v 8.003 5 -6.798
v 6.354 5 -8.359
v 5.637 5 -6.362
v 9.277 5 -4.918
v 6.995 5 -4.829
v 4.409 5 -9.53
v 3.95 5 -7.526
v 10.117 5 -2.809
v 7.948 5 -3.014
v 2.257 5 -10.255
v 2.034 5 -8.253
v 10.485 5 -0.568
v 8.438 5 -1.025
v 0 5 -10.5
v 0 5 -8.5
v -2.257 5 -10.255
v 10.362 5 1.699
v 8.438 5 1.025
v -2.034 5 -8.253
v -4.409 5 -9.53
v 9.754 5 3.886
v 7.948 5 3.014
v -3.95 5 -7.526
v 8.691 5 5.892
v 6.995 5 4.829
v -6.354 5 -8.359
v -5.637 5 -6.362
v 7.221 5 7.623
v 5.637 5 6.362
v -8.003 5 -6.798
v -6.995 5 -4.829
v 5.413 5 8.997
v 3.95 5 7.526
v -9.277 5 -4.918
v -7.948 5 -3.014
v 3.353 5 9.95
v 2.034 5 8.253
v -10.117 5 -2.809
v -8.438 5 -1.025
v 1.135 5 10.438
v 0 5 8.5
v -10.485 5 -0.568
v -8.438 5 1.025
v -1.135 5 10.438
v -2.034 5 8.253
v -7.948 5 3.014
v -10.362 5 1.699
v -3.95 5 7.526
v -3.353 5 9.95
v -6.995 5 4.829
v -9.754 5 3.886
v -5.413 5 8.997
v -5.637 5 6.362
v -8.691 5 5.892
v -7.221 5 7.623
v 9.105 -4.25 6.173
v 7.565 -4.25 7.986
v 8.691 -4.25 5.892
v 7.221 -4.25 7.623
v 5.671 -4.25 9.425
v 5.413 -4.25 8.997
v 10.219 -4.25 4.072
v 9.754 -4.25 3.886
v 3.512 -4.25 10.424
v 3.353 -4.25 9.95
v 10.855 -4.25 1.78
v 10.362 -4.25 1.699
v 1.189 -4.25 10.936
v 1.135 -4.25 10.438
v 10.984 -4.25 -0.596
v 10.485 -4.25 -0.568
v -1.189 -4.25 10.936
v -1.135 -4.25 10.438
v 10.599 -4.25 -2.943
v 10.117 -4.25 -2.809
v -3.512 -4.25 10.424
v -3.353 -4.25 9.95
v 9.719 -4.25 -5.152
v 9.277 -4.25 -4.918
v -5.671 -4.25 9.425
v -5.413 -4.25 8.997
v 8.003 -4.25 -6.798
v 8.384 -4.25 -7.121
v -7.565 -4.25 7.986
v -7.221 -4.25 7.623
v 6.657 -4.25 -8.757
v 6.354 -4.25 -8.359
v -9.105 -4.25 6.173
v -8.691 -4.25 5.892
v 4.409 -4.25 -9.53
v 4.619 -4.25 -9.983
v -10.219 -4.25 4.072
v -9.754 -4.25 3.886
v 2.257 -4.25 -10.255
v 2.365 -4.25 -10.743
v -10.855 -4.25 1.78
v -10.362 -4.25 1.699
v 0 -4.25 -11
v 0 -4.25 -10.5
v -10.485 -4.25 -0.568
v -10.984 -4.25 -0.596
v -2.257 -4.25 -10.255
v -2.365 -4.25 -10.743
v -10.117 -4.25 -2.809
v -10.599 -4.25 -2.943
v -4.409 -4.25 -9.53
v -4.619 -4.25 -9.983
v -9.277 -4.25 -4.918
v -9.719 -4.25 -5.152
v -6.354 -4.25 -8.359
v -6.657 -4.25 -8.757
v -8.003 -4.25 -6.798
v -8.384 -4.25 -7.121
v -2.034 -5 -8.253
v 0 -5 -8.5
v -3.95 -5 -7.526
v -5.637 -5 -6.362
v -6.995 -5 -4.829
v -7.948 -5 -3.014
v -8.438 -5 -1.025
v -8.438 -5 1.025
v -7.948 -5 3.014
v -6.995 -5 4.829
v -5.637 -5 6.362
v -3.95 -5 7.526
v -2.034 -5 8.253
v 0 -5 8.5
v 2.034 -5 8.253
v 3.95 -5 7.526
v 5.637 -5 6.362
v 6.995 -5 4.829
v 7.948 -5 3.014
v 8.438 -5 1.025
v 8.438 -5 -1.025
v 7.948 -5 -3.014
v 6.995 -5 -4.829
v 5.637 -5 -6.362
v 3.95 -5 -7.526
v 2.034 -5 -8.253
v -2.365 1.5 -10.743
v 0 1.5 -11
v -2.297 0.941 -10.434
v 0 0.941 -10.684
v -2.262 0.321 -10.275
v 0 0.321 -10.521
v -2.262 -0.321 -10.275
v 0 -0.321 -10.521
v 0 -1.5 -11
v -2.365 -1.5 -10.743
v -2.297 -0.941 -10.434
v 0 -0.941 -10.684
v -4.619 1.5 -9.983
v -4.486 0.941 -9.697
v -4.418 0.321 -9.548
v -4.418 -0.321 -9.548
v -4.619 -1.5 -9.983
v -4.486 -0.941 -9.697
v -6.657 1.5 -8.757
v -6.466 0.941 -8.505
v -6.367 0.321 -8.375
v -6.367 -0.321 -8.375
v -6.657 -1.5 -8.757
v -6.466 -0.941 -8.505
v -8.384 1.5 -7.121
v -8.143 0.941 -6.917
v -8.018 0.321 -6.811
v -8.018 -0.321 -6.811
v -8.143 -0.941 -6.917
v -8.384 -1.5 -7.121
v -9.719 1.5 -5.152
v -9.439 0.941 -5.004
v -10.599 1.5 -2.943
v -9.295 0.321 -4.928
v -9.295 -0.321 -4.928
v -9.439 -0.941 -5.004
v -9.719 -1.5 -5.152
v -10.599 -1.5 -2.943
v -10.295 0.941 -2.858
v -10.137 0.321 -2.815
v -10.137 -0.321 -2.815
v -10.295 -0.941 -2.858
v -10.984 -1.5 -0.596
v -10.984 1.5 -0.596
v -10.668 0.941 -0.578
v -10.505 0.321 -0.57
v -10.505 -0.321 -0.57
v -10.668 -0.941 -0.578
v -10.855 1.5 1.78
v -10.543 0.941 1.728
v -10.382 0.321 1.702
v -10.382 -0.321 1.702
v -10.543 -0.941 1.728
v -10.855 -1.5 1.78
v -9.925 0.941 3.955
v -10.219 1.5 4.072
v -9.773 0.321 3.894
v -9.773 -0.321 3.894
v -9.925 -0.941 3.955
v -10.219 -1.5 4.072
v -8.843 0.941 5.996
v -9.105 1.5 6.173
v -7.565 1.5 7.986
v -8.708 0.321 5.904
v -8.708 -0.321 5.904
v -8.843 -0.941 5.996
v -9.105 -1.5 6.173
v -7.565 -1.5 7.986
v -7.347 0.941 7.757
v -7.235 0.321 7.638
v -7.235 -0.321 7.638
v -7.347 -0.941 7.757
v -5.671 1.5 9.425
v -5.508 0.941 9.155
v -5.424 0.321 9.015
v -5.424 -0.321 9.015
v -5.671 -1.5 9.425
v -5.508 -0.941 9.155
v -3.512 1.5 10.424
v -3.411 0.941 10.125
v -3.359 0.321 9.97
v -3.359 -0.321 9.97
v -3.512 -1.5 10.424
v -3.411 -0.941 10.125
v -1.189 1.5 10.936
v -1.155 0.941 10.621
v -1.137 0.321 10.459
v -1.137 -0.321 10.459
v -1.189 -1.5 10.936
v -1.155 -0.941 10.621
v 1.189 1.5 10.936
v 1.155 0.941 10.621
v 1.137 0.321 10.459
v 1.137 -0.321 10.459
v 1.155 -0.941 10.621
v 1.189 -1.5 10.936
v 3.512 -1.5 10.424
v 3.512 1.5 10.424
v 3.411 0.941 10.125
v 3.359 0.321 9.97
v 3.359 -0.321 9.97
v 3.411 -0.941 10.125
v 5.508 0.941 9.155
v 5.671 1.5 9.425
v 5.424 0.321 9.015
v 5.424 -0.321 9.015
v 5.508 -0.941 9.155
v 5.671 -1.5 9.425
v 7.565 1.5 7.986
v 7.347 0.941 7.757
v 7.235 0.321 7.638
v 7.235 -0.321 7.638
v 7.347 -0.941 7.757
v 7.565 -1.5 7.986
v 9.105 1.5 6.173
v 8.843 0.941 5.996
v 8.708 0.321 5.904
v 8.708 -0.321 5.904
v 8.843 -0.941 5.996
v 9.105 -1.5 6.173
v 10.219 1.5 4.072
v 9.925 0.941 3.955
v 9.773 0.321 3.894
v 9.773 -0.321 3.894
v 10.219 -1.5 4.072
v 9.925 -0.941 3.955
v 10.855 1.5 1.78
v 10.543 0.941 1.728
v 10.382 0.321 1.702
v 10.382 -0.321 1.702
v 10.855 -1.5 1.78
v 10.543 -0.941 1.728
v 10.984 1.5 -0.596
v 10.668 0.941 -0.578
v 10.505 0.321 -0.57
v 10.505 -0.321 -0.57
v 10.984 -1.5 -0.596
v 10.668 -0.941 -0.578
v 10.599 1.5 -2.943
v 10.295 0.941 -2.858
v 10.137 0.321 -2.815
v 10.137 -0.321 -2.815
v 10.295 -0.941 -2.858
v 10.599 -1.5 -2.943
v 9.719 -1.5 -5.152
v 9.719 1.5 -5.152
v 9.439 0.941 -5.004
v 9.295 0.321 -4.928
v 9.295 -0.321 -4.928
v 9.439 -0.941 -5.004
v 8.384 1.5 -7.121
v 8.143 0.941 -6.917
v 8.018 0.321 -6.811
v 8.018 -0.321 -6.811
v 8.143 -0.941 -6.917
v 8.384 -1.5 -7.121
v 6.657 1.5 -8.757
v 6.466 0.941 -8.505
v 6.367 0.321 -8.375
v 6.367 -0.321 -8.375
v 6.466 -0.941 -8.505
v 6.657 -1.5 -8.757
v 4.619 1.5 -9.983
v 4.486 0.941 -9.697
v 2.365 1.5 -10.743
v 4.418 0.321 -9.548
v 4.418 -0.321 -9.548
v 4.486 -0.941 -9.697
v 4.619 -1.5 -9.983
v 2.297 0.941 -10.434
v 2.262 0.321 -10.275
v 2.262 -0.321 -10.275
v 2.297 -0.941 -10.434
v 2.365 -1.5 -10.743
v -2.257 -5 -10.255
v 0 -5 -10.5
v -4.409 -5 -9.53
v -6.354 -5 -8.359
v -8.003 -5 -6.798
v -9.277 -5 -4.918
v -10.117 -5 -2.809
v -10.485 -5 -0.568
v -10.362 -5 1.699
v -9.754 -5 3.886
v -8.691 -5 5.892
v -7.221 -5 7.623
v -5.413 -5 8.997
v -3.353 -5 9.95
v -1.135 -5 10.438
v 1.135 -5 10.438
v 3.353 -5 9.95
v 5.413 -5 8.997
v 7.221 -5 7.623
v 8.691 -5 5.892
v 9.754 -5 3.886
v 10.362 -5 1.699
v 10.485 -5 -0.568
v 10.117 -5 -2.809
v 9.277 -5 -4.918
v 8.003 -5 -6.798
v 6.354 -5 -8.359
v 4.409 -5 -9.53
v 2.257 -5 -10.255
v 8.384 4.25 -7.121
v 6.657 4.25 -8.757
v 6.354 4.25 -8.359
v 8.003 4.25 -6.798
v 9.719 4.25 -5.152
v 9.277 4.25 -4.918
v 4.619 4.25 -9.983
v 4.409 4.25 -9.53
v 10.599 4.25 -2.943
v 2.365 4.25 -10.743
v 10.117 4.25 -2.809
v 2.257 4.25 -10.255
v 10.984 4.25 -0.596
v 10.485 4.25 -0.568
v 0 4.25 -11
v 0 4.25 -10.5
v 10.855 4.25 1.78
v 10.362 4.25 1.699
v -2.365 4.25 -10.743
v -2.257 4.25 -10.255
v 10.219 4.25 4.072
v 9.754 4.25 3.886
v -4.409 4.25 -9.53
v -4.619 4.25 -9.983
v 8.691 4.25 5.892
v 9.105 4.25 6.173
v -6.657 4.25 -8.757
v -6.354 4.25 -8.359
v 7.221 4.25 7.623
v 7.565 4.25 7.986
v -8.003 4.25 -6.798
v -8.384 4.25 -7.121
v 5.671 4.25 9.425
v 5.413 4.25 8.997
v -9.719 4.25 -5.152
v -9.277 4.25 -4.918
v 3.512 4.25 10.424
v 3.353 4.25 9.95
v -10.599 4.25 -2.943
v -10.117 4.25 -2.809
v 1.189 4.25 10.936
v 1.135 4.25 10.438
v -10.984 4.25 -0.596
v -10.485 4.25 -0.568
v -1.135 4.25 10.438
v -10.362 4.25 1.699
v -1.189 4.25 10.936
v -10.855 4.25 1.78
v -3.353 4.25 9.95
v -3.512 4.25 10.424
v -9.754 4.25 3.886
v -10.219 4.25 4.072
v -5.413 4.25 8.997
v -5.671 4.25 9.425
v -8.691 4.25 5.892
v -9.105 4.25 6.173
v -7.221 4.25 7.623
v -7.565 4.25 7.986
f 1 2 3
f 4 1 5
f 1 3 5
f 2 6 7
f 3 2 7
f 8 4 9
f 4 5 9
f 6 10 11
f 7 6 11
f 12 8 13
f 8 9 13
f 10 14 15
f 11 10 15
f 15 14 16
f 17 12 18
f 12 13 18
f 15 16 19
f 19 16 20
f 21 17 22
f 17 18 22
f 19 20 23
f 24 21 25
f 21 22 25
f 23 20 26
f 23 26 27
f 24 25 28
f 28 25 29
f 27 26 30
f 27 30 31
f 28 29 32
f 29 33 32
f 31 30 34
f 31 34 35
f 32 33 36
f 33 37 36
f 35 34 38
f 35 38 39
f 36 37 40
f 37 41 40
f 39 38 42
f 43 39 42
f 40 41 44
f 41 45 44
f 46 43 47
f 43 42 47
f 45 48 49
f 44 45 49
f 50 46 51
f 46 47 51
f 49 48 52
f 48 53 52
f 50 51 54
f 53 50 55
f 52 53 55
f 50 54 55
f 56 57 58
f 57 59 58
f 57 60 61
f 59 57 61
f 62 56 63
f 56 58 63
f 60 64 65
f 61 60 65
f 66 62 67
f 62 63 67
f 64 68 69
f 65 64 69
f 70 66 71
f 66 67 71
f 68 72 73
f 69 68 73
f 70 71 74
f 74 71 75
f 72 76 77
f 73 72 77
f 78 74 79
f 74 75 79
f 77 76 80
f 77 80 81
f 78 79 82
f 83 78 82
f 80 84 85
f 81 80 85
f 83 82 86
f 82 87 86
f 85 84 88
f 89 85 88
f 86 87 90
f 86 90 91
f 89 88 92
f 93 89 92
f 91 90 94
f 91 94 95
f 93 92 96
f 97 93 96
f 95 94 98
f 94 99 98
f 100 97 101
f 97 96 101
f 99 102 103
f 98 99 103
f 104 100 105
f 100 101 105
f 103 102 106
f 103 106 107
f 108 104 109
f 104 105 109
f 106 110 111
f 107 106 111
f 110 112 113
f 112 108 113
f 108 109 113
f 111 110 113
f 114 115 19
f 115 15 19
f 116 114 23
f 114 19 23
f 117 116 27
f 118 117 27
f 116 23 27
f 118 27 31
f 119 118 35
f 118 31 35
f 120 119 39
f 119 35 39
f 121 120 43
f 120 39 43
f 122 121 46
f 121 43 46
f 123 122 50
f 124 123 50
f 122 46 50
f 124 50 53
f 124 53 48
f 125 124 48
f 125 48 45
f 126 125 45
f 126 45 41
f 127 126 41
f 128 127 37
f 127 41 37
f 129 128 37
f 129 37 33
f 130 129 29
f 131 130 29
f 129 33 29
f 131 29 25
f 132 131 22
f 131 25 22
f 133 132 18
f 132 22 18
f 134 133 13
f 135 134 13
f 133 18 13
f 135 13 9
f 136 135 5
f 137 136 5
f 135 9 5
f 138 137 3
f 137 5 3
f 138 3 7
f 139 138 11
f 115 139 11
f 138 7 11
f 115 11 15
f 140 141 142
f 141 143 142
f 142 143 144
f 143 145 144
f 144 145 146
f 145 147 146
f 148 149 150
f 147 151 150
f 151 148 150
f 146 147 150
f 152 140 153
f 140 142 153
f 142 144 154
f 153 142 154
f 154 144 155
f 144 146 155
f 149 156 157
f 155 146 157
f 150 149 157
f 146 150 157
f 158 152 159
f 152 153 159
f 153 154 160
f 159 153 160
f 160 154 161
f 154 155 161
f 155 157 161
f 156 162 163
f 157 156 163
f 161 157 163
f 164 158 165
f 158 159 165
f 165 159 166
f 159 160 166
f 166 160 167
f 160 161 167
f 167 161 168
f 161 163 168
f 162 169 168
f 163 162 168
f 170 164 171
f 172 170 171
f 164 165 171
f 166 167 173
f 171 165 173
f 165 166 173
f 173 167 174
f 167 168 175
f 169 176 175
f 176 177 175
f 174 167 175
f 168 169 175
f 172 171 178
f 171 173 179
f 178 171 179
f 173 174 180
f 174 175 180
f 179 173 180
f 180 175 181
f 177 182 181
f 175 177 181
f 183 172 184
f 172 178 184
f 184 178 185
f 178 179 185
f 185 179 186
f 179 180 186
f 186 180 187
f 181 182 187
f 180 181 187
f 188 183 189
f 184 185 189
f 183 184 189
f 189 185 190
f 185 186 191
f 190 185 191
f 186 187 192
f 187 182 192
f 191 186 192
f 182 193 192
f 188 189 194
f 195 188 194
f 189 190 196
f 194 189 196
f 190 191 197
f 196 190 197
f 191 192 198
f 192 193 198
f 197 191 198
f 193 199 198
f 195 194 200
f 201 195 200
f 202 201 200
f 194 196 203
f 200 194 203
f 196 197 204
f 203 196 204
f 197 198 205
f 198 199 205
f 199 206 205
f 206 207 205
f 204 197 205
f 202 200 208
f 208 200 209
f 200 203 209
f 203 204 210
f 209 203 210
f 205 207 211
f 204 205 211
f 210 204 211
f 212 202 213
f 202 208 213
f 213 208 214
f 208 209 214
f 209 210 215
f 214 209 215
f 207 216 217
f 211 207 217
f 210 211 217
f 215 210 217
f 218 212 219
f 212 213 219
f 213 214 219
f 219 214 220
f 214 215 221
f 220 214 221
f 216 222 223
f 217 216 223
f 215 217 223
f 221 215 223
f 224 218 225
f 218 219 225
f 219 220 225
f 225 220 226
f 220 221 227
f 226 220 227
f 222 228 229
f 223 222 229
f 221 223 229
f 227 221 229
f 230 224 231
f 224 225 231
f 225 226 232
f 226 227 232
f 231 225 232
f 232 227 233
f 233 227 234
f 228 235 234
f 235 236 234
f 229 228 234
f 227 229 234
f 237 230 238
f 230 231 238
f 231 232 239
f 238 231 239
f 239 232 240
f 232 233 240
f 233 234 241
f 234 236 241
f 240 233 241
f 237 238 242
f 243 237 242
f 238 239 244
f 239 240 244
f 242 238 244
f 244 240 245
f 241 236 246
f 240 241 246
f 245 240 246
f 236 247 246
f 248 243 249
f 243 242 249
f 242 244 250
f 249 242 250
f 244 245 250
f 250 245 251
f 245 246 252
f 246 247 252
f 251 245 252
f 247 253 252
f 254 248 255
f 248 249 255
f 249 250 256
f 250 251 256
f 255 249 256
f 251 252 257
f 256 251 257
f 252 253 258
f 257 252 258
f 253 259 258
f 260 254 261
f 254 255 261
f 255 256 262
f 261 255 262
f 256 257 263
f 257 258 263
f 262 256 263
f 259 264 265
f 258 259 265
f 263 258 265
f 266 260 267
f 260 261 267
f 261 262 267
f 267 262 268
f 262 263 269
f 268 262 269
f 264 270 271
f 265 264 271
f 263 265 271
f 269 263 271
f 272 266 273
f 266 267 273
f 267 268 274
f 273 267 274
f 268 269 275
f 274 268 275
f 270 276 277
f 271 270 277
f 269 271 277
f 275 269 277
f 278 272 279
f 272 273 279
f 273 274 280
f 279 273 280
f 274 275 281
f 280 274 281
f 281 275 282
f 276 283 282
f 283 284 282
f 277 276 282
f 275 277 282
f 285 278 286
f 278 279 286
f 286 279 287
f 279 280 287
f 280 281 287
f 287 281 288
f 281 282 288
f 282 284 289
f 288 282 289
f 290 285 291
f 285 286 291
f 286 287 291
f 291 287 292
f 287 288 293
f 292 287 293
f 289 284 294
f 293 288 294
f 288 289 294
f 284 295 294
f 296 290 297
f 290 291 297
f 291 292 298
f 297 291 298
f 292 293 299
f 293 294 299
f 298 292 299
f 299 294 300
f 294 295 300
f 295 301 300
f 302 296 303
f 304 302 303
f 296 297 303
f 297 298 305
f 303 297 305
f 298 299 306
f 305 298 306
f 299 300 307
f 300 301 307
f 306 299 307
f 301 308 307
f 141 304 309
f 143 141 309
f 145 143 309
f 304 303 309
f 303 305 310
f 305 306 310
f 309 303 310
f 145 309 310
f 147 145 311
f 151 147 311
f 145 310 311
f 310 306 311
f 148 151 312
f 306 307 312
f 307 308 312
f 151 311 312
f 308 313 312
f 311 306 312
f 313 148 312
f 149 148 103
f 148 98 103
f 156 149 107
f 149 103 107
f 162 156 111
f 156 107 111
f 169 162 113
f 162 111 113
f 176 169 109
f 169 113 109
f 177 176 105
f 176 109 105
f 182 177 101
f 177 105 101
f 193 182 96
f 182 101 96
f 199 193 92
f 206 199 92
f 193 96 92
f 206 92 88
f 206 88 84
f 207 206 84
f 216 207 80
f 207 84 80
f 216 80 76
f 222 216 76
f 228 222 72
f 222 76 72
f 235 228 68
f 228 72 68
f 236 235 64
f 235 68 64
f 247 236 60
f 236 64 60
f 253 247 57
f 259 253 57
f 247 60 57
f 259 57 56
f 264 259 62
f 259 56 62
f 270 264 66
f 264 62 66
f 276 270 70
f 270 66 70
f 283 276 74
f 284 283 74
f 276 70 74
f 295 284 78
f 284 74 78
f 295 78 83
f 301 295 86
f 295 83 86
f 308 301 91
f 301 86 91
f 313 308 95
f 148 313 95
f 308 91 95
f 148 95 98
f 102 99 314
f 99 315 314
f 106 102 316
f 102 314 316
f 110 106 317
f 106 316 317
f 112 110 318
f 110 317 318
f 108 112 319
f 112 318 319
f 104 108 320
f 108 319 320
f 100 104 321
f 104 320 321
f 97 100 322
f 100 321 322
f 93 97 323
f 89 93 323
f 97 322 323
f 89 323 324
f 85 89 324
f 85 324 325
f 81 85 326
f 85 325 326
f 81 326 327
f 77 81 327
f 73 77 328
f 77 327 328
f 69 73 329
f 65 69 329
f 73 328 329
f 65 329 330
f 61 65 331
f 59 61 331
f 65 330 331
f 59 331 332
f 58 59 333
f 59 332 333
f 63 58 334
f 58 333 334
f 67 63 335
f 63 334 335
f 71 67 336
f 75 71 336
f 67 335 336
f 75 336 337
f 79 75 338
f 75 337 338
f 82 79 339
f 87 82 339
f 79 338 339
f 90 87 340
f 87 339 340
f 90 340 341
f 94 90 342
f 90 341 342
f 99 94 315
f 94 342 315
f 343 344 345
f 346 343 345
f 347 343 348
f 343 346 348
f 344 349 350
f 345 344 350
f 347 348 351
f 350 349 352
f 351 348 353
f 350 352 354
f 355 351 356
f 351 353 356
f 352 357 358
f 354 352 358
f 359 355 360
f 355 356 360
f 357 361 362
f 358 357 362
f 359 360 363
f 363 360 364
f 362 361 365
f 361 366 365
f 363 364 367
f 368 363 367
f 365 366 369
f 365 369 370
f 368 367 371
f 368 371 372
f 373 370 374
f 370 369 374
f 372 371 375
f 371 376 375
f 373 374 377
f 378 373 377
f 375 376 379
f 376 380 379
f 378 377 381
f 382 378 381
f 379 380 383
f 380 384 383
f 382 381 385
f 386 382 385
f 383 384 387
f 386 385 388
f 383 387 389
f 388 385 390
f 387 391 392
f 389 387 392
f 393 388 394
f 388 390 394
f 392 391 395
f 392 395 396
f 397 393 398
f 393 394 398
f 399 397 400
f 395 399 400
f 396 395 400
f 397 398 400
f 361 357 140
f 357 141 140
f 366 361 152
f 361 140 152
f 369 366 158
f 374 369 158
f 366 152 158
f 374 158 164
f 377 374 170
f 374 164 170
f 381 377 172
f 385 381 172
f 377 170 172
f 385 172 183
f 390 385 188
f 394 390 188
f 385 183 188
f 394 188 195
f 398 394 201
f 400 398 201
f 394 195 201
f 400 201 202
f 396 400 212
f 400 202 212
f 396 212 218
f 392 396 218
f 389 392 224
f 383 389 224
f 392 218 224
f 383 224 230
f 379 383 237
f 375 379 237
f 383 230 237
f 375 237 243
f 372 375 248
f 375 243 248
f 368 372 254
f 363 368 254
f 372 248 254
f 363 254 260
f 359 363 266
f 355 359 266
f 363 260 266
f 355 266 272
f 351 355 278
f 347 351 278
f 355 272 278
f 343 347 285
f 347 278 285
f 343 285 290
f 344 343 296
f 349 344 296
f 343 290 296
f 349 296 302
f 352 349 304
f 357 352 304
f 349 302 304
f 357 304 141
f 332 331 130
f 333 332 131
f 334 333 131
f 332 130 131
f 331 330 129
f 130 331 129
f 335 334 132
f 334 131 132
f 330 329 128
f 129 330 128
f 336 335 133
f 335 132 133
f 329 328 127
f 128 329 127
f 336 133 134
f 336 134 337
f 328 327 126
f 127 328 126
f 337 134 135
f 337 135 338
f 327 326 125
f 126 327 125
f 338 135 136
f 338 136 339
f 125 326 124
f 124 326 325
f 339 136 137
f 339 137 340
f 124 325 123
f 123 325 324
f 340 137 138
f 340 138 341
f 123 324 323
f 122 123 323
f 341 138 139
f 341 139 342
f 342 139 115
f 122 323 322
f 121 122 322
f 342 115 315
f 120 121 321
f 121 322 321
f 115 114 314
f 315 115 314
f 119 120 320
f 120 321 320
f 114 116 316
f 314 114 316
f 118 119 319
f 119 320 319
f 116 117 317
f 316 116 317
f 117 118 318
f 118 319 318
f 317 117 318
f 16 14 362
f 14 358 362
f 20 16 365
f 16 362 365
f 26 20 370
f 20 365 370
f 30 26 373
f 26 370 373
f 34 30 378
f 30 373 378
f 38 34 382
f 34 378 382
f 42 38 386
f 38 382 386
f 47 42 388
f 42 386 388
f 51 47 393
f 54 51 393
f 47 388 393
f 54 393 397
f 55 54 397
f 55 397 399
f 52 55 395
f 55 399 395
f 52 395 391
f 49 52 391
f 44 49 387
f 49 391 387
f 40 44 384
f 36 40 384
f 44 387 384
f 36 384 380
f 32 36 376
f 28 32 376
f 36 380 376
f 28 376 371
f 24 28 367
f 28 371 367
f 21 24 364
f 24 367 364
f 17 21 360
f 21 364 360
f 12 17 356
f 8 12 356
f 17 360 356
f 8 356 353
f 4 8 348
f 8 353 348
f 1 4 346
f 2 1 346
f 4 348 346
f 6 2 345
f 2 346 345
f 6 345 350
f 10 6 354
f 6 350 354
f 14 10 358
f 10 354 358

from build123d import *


with BuildPart() as part:
    # Sketch1 → Revolve2 (revolve)
    with BuildSketch(Plane.XY, mode=Mode.PRIVATE) as revolve2_sk:
        with BuildLine():
            Line((11, 4.25), (11, 1.5))
            ThreePointArc((11, 1.5), (10.5, 0), (11, -1.5))
            Line((11, -1.5), (11, -4.25))
            Line((11, -4.25), (10.5, -4.25))
            Line((10.5, -4.25), (10.5, -5))
            Line((10.5, -5), (8.5, -5))
            Line((8.5, -5), (8.5, 5))
            Line((8.5, 5), (10.5, 5))
            Line((10.5, 5), (10.5, 4.25))
            Line((10.5, 4.25), (11, 4.25))
        make_face()
    revolve(revolve2_sk.sketch.rotate(Axis((0, 0, 0), (0, 1, 0)), 90), axis=Axis((0, 0, 0), (0, 1, 0)))


solid = part.part
